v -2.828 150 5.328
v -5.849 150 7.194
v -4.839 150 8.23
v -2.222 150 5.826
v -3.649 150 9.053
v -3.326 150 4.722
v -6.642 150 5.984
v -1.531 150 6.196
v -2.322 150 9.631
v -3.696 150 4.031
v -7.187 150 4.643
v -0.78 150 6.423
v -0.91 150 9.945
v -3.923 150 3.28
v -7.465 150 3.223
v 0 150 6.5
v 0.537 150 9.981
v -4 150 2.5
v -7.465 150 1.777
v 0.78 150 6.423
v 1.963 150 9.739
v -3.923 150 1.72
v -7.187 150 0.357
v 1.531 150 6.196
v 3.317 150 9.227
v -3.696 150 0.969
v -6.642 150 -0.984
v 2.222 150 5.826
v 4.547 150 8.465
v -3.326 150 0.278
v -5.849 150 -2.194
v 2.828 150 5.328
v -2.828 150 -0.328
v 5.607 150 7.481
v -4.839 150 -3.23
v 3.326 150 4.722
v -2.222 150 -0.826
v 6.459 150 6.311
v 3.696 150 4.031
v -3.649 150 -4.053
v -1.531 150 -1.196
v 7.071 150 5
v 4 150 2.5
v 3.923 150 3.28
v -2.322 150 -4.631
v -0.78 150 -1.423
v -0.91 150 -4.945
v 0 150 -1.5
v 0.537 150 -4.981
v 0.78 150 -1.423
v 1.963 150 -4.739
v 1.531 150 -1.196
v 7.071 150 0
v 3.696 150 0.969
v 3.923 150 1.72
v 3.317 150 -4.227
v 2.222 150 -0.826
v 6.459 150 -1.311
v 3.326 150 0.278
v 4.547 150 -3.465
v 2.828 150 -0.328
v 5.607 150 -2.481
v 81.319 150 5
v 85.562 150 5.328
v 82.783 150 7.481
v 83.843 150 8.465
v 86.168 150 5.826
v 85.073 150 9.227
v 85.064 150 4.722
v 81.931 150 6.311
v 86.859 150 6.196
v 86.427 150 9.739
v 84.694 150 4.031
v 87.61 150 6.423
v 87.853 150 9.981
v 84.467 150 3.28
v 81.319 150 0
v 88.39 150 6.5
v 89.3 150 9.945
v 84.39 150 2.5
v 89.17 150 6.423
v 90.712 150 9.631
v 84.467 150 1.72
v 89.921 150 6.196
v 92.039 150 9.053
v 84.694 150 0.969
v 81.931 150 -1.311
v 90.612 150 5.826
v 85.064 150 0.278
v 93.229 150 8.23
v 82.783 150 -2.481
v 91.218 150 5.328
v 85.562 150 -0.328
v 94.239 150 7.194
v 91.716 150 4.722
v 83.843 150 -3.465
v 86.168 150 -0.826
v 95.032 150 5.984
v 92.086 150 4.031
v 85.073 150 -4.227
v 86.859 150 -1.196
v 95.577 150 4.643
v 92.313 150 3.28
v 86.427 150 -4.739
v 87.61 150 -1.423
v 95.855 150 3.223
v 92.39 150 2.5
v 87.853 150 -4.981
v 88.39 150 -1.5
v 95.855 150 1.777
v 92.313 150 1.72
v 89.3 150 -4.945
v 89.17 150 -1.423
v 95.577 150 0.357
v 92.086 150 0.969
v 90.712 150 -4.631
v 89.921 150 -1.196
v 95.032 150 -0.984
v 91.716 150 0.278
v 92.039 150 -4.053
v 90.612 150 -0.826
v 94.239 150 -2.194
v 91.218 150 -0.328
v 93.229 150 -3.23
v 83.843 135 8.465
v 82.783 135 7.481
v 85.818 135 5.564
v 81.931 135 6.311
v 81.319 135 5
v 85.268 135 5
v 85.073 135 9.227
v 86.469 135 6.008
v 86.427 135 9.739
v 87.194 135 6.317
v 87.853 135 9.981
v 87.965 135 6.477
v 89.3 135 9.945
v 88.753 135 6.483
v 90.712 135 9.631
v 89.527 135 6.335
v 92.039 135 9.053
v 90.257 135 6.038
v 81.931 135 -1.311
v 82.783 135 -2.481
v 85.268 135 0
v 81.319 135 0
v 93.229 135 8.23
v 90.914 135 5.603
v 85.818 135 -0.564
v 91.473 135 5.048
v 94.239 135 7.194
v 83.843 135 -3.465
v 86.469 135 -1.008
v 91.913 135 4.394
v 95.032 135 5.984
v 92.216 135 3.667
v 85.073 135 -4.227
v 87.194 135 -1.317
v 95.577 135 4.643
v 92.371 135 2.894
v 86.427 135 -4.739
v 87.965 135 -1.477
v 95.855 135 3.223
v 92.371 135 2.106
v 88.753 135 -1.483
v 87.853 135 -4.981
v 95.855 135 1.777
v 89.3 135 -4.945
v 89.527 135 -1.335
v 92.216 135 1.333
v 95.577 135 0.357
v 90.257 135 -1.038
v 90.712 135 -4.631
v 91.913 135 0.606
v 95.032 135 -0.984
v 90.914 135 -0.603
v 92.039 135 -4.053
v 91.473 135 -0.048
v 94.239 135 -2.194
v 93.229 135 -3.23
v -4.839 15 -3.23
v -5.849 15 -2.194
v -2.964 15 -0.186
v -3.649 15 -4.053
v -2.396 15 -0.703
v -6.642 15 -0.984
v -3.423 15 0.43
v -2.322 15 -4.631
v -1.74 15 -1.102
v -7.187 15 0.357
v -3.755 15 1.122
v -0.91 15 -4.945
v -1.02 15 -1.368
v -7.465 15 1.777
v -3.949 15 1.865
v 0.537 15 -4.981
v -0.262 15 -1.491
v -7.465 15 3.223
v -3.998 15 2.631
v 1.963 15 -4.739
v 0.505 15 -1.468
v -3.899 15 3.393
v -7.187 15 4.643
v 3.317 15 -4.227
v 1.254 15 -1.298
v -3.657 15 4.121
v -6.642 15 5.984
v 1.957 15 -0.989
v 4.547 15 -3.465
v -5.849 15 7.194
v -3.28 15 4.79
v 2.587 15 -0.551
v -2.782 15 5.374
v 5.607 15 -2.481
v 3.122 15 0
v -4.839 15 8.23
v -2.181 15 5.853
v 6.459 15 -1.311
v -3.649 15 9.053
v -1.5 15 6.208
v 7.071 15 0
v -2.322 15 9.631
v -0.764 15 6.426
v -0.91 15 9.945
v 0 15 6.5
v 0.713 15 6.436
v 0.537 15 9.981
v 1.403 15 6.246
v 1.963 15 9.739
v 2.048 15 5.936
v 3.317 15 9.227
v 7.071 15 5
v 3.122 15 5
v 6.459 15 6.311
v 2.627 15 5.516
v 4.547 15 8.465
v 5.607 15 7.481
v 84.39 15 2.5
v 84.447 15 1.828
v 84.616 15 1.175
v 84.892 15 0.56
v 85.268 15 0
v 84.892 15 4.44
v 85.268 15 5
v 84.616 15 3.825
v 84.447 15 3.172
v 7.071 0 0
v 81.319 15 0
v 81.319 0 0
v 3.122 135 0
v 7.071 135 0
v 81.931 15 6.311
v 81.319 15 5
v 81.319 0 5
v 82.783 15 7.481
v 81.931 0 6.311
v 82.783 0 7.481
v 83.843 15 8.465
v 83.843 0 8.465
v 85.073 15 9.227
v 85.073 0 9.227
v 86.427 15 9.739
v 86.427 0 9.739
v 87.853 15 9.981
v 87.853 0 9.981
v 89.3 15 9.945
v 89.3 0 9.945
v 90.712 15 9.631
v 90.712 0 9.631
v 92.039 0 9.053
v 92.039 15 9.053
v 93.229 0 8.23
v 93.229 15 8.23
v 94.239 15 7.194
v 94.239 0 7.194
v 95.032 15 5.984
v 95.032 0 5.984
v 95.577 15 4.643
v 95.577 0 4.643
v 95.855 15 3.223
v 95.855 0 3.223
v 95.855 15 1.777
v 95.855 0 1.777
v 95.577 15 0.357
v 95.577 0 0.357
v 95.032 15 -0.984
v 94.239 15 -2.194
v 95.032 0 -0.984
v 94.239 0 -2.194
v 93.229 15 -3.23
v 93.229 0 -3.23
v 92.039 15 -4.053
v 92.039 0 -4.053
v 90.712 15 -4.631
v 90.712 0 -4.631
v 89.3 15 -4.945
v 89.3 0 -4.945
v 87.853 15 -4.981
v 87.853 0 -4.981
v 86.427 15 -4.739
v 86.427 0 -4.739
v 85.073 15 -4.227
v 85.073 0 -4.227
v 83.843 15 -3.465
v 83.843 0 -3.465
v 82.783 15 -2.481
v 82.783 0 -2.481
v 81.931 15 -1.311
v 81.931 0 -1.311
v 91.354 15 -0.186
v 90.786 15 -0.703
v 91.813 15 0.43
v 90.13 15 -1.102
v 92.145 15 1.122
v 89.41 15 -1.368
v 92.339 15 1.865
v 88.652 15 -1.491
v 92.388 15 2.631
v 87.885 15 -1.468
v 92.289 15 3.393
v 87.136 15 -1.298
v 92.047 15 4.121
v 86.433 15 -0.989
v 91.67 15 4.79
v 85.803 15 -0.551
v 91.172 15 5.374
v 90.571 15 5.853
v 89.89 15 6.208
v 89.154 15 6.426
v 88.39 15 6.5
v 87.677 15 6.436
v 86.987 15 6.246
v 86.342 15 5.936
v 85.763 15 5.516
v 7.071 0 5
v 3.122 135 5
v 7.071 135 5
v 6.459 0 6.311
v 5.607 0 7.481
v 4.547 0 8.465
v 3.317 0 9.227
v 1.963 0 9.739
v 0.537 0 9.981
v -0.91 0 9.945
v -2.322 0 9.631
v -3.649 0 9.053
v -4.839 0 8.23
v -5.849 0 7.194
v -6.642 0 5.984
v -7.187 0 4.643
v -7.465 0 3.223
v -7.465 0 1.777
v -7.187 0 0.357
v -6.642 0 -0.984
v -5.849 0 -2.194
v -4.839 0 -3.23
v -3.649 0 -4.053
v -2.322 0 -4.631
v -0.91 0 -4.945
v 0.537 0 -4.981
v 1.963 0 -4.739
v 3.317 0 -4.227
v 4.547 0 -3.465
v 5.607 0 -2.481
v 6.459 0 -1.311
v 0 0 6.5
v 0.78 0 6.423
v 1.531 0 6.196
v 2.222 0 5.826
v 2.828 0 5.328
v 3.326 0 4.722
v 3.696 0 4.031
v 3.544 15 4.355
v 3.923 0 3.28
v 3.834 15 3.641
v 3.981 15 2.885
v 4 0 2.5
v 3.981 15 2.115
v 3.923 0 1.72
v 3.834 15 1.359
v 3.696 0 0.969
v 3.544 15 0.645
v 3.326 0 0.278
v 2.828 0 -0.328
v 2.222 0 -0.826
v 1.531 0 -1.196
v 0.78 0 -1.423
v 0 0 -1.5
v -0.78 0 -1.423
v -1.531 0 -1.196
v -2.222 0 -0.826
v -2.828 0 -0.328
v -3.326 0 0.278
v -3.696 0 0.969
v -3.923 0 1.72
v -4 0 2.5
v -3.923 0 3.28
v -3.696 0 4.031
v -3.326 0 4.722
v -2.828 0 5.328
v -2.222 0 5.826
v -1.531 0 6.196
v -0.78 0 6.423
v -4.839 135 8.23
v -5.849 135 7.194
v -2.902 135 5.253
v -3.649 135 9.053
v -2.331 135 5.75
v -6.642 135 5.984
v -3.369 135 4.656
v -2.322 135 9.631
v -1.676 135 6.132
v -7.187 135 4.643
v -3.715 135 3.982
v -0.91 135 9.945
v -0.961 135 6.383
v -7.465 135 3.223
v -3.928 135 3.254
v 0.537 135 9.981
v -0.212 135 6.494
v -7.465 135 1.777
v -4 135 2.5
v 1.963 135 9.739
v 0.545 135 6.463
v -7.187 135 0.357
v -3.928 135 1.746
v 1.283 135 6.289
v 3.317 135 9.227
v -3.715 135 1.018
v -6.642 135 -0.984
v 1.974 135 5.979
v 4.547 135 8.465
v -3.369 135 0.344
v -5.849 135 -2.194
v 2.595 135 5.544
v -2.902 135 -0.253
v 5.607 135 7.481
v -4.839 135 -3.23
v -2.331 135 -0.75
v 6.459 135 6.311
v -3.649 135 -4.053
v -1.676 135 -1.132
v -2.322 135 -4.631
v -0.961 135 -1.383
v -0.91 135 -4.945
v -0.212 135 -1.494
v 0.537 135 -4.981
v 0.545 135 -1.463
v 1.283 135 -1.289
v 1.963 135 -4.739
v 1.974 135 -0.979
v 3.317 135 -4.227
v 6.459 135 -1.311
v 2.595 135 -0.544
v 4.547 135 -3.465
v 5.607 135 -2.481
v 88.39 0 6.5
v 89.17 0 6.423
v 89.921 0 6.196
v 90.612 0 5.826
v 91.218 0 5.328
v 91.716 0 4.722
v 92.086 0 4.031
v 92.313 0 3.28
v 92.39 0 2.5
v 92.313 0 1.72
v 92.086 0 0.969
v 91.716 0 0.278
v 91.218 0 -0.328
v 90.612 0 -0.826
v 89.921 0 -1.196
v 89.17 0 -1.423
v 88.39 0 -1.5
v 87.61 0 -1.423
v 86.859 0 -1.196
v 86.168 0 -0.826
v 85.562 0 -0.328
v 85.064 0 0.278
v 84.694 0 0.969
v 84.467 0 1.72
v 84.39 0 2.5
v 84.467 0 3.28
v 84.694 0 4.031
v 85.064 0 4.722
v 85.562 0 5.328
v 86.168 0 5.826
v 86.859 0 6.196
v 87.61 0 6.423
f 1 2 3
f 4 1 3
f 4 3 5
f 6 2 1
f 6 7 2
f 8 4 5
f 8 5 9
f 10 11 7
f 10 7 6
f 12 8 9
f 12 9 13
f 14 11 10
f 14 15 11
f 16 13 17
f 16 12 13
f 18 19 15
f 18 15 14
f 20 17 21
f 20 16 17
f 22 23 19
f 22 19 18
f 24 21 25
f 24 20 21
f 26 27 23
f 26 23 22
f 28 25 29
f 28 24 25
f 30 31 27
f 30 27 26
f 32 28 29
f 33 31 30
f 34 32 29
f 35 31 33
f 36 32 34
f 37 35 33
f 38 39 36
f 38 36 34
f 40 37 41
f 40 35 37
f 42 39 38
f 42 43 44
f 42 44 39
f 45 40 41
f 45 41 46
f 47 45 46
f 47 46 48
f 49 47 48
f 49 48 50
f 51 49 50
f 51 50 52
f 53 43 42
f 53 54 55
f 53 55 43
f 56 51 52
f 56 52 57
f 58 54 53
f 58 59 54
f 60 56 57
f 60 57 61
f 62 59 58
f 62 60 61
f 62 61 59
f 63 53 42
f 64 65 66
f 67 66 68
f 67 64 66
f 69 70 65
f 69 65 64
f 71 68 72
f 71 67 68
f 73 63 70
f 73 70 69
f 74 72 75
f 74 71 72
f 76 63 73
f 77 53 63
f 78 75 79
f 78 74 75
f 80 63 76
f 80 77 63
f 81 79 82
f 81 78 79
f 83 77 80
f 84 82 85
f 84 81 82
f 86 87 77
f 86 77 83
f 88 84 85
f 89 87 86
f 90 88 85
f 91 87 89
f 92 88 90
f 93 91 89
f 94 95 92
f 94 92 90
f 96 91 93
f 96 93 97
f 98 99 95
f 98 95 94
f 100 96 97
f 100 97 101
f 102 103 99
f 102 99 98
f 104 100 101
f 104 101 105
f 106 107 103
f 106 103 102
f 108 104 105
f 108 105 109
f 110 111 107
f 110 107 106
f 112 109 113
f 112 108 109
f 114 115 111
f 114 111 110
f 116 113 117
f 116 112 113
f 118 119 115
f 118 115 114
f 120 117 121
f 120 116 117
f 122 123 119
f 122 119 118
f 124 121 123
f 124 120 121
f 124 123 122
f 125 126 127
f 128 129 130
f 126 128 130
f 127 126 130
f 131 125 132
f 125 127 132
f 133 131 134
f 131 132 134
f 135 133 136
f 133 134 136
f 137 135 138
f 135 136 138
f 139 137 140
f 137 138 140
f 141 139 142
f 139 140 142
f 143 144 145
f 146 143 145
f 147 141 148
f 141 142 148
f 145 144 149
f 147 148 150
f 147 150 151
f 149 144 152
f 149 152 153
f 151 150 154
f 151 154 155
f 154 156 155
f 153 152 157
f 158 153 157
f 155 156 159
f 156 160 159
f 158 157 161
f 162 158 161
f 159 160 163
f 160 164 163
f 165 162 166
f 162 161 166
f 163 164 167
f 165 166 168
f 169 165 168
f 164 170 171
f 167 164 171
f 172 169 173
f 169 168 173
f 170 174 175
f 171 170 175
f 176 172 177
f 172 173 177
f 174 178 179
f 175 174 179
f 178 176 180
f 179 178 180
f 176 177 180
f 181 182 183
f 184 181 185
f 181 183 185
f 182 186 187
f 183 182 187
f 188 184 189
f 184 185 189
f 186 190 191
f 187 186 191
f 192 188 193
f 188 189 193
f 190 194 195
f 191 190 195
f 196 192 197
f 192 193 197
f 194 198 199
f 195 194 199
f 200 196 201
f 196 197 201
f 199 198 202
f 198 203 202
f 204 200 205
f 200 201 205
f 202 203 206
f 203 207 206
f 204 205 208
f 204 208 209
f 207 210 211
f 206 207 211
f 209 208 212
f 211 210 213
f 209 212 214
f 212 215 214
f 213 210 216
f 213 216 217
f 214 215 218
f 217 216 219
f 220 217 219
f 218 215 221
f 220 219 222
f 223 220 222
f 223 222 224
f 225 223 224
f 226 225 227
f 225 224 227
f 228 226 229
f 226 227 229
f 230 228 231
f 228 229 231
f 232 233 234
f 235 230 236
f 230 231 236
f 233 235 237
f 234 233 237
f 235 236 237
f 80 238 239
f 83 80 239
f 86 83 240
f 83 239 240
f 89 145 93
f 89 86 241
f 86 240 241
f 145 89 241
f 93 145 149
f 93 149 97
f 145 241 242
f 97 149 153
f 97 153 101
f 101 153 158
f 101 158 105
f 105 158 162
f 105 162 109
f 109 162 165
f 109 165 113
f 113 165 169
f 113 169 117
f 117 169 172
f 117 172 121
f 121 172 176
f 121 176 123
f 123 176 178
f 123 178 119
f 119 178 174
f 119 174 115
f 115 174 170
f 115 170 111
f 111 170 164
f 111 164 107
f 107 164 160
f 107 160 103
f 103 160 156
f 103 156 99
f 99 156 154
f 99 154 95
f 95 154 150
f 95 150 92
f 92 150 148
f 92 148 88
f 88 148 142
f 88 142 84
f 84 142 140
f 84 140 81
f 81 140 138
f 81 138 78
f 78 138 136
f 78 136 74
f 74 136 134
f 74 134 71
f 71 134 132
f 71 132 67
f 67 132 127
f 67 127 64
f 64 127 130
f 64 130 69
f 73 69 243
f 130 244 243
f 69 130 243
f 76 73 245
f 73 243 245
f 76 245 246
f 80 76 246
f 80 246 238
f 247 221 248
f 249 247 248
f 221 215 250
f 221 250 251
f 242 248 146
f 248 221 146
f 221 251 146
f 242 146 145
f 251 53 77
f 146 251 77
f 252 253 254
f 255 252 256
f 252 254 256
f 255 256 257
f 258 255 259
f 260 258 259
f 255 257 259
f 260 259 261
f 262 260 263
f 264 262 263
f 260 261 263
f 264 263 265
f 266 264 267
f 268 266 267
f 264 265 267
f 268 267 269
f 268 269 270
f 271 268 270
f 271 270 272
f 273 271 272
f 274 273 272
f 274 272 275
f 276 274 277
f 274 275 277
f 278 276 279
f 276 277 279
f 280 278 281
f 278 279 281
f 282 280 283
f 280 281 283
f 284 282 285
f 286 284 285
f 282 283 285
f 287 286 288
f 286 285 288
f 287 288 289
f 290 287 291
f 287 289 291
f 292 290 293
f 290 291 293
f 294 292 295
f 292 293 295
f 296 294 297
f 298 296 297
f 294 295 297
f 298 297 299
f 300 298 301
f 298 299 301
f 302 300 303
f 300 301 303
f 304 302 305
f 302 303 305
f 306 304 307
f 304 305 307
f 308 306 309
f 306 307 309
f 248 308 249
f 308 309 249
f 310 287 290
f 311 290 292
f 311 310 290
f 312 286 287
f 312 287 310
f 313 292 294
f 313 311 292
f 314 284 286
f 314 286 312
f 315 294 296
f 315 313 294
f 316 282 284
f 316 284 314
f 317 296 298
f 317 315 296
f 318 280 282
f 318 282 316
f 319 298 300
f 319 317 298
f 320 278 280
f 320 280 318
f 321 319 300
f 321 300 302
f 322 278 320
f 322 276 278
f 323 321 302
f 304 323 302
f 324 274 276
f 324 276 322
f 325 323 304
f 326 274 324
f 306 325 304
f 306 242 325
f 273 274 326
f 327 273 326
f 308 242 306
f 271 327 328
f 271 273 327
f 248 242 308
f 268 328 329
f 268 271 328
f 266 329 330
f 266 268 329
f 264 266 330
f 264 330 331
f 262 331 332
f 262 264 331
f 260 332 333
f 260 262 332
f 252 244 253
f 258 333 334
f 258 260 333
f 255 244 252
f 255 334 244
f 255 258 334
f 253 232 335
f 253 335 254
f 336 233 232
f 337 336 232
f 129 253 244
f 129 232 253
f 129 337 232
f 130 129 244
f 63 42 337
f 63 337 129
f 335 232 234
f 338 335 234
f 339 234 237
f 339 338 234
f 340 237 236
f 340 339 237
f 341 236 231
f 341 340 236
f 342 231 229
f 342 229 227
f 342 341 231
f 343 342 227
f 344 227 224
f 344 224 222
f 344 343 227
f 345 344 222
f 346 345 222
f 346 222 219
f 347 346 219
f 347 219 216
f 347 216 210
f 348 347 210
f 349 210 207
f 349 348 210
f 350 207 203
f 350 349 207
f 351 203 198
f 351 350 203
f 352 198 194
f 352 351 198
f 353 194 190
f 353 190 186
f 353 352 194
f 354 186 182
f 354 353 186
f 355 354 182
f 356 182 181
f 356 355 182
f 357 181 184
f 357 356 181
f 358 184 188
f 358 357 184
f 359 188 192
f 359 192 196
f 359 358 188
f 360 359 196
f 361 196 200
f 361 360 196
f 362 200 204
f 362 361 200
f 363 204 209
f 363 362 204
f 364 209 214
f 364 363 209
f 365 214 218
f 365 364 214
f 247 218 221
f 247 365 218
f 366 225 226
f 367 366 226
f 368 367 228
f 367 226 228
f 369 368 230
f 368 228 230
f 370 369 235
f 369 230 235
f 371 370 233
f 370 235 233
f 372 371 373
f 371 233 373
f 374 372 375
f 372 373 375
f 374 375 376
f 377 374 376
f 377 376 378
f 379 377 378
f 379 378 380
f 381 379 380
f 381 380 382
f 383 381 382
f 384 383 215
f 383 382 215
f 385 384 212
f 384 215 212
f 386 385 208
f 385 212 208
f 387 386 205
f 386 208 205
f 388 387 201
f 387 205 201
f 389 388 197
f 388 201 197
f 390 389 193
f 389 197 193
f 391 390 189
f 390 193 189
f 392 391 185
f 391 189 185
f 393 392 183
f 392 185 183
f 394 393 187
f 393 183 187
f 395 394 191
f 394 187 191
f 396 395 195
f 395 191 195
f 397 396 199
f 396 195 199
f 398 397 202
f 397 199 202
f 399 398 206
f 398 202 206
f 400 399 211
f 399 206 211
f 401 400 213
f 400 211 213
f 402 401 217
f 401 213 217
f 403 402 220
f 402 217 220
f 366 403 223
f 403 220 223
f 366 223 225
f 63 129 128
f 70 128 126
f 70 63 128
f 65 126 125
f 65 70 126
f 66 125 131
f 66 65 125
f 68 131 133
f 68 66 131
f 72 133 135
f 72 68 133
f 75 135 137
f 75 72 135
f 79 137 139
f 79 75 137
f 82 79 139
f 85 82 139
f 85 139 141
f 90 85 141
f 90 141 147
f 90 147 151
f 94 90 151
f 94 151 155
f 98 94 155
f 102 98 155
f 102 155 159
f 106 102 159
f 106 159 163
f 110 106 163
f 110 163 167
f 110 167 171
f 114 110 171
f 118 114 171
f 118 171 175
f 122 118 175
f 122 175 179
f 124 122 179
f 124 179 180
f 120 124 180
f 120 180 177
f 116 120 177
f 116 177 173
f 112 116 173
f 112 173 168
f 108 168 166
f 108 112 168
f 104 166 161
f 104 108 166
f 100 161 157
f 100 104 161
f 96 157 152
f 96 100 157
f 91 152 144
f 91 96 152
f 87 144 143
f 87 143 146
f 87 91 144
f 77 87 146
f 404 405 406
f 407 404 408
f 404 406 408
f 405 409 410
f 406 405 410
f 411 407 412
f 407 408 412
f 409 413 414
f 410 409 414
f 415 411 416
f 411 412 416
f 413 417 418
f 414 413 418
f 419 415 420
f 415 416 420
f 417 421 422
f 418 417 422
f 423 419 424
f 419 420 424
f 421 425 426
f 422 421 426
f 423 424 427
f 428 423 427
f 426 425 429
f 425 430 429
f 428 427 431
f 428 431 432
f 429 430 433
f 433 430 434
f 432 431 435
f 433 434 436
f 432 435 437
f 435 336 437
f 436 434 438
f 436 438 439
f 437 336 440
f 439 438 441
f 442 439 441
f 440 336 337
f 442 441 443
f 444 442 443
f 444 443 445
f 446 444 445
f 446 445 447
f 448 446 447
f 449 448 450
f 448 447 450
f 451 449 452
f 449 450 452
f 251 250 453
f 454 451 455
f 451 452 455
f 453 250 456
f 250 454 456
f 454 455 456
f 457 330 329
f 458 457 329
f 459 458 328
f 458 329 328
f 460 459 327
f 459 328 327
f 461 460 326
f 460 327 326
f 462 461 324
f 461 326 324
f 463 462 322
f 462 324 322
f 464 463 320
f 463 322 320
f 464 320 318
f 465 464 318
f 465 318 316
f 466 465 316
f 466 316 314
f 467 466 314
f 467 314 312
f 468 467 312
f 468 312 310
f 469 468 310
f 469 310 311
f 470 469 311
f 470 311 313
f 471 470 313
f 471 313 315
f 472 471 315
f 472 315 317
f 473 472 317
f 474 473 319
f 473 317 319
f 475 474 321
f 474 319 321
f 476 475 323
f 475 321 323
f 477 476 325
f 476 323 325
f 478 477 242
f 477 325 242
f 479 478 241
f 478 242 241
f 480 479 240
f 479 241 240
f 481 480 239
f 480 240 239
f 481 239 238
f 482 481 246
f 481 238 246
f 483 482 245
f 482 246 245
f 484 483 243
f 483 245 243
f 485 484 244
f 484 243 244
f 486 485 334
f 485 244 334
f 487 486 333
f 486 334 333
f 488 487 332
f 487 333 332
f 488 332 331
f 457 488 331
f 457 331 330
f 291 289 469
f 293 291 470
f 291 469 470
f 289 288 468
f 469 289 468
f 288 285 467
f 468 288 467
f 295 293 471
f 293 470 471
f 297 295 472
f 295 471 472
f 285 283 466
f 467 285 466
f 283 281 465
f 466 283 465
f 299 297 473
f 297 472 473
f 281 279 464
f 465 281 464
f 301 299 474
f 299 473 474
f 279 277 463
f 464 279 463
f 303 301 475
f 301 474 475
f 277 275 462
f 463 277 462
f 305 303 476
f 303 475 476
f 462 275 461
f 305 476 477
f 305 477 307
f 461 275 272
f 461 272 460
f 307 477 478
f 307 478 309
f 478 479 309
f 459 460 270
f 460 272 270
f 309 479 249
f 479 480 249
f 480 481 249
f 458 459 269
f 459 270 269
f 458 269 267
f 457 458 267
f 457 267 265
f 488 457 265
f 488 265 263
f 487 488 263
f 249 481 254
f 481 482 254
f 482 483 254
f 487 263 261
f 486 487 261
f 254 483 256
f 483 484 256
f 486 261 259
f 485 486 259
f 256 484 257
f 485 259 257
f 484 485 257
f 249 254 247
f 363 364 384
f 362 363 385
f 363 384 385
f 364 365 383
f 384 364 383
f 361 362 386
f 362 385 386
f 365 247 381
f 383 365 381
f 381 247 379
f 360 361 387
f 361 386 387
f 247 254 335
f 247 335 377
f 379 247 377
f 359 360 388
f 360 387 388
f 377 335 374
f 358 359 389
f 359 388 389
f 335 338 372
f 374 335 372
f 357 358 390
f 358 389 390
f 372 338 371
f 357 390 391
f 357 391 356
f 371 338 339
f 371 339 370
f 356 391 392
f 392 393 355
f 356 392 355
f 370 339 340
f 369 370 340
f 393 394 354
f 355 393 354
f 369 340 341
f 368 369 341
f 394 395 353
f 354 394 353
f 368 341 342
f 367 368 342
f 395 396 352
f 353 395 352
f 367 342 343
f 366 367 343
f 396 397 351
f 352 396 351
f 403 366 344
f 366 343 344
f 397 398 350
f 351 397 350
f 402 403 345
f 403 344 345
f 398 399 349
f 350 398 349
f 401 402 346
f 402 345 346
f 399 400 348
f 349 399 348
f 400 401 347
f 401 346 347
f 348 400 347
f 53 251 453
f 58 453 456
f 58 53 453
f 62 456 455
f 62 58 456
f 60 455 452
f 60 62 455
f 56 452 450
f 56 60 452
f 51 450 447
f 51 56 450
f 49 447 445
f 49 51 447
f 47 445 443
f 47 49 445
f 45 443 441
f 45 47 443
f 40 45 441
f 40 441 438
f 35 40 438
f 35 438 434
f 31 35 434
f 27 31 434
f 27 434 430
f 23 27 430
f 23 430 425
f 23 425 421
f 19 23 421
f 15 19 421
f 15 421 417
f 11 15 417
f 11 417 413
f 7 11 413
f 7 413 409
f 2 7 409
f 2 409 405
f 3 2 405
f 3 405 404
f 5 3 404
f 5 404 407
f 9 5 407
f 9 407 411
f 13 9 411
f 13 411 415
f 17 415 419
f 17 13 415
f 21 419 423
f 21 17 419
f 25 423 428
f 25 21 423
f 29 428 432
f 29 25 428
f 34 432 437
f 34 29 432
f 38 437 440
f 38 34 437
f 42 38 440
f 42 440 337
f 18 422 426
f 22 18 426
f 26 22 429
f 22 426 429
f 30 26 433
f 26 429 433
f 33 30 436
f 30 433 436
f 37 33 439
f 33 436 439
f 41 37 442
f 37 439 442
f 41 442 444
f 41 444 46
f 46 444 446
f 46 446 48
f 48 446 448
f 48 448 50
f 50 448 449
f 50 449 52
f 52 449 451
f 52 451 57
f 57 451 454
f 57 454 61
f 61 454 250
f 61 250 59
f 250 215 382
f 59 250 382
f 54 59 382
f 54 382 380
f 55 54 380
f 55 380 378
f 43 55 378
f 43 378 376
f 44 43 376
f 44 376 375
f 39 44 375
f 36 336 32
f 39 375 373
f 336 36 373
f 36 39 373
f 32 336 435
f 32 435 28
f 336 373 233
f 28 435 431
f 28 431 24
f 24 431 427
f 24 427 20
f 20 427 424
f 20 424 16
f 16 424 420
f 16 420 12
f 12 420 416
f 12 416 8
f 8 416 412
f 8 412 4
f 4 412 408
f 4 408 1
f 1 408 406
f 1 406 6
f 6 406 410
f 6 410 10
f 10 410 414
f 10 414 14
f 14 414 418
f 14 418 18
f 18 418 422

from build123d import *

# Parameters (mm, degrees)
SKETCH_1_W          = 88.39
SKETCH_1_H          = 150
EXTRUDE_1_DEPTH     = 5
SKETCH_2_R          = 7.5
EXTRUDE_2_DEPTH     = 15
HOLE_WIZARD_1_D     = 8
EXTRUDE_3_DEPTH     = 15
SKETCH_8_R          = 4
CUT_EXTRUDE_1_DEPTH = 166.891205614


with BuildPart() as part:
    # 스케치1 → 보스-돌출1 (new body)
    with BuildSketch(Plane.XY):
        with Locations((44.195, 75)):
            Rectangle(SKETCH_1_W, SKETCH_1_H)
    extrude(amount=EXTRUDE_1_DEPTH)

    # 스케치2 → 보스-돌출2 (add)
    with BuildSketch(Plane(origin=(0, 150, 0), x_dir=(1, 0, 0), z_dir=(0, 1, 0))):
        with Locations((88.39, -2.5)):
            Circle(SKETCH_2_R)
        with Locations((0, -2.5)):
            Circle(SKETCH_2_R)
    extrude(amount=-EXTRUDE_2_DEPTH)

    # 구멍1 (through all)
    with Locations(Plane(origin=(0, 150, 0), x_dir=(1, 0, 0), z_dir=(0, 1, 0))):
        with Locations((0, -2.5), (88.39, -2.5)):
            Hole(HOLE_WIZARD_1_D / 2)

    # 스케치7 → 보스-돌출3 (add)
    with BuildSketch(Plane.XZ):
        with BuildLine():
            Line((81.318932188, 0), (85.267501001, 0))
            ThreePointArc((85.267501001, 0), (84.39, 2.5), (85.267501001, 5))
            Line((85.267501001, 5), (81.318932188, 5))
            ThreePointArc((81.318932188, 5), (95.89, 2.5), (81.318932188, 0))
        make_face()
        with BuildLine():
            Line((3.122498999, 5), (7.071067812, 5))
            ThreePointArc((7.071067812, 5), (-7.5, 2.5), (7.071067812, 0))
            Line((7.071067812, 0), (3.122498999, 0))
            ThreePointArc((3.122498999, 0), (4, 2.5), (3.122498999, 5))
        make_face()
    extrude(amount=-EXTRUDE_3_DEPTH)

    # 스케치8 → 컷-돌출1 (cut, through all)
    with BuildSketch(Plane(origin=(0, 15, 0), x_dir=(1, 0, 0), z_dir=(0, 1, 0))):
        with Locations(Location((0, -2.5, 0), (0, 0, 270))):
            Circle(SKETCH_8_R)
        with Locations(Location((88.39, -2.5, 0), (0, 0, 270))):
            Circle(SKETCH_8_R)
    extrude(amount=-CUT_EXTRUDE_1_DEPTH, mode=Mode.SUBTRACT)


solid = part.part
